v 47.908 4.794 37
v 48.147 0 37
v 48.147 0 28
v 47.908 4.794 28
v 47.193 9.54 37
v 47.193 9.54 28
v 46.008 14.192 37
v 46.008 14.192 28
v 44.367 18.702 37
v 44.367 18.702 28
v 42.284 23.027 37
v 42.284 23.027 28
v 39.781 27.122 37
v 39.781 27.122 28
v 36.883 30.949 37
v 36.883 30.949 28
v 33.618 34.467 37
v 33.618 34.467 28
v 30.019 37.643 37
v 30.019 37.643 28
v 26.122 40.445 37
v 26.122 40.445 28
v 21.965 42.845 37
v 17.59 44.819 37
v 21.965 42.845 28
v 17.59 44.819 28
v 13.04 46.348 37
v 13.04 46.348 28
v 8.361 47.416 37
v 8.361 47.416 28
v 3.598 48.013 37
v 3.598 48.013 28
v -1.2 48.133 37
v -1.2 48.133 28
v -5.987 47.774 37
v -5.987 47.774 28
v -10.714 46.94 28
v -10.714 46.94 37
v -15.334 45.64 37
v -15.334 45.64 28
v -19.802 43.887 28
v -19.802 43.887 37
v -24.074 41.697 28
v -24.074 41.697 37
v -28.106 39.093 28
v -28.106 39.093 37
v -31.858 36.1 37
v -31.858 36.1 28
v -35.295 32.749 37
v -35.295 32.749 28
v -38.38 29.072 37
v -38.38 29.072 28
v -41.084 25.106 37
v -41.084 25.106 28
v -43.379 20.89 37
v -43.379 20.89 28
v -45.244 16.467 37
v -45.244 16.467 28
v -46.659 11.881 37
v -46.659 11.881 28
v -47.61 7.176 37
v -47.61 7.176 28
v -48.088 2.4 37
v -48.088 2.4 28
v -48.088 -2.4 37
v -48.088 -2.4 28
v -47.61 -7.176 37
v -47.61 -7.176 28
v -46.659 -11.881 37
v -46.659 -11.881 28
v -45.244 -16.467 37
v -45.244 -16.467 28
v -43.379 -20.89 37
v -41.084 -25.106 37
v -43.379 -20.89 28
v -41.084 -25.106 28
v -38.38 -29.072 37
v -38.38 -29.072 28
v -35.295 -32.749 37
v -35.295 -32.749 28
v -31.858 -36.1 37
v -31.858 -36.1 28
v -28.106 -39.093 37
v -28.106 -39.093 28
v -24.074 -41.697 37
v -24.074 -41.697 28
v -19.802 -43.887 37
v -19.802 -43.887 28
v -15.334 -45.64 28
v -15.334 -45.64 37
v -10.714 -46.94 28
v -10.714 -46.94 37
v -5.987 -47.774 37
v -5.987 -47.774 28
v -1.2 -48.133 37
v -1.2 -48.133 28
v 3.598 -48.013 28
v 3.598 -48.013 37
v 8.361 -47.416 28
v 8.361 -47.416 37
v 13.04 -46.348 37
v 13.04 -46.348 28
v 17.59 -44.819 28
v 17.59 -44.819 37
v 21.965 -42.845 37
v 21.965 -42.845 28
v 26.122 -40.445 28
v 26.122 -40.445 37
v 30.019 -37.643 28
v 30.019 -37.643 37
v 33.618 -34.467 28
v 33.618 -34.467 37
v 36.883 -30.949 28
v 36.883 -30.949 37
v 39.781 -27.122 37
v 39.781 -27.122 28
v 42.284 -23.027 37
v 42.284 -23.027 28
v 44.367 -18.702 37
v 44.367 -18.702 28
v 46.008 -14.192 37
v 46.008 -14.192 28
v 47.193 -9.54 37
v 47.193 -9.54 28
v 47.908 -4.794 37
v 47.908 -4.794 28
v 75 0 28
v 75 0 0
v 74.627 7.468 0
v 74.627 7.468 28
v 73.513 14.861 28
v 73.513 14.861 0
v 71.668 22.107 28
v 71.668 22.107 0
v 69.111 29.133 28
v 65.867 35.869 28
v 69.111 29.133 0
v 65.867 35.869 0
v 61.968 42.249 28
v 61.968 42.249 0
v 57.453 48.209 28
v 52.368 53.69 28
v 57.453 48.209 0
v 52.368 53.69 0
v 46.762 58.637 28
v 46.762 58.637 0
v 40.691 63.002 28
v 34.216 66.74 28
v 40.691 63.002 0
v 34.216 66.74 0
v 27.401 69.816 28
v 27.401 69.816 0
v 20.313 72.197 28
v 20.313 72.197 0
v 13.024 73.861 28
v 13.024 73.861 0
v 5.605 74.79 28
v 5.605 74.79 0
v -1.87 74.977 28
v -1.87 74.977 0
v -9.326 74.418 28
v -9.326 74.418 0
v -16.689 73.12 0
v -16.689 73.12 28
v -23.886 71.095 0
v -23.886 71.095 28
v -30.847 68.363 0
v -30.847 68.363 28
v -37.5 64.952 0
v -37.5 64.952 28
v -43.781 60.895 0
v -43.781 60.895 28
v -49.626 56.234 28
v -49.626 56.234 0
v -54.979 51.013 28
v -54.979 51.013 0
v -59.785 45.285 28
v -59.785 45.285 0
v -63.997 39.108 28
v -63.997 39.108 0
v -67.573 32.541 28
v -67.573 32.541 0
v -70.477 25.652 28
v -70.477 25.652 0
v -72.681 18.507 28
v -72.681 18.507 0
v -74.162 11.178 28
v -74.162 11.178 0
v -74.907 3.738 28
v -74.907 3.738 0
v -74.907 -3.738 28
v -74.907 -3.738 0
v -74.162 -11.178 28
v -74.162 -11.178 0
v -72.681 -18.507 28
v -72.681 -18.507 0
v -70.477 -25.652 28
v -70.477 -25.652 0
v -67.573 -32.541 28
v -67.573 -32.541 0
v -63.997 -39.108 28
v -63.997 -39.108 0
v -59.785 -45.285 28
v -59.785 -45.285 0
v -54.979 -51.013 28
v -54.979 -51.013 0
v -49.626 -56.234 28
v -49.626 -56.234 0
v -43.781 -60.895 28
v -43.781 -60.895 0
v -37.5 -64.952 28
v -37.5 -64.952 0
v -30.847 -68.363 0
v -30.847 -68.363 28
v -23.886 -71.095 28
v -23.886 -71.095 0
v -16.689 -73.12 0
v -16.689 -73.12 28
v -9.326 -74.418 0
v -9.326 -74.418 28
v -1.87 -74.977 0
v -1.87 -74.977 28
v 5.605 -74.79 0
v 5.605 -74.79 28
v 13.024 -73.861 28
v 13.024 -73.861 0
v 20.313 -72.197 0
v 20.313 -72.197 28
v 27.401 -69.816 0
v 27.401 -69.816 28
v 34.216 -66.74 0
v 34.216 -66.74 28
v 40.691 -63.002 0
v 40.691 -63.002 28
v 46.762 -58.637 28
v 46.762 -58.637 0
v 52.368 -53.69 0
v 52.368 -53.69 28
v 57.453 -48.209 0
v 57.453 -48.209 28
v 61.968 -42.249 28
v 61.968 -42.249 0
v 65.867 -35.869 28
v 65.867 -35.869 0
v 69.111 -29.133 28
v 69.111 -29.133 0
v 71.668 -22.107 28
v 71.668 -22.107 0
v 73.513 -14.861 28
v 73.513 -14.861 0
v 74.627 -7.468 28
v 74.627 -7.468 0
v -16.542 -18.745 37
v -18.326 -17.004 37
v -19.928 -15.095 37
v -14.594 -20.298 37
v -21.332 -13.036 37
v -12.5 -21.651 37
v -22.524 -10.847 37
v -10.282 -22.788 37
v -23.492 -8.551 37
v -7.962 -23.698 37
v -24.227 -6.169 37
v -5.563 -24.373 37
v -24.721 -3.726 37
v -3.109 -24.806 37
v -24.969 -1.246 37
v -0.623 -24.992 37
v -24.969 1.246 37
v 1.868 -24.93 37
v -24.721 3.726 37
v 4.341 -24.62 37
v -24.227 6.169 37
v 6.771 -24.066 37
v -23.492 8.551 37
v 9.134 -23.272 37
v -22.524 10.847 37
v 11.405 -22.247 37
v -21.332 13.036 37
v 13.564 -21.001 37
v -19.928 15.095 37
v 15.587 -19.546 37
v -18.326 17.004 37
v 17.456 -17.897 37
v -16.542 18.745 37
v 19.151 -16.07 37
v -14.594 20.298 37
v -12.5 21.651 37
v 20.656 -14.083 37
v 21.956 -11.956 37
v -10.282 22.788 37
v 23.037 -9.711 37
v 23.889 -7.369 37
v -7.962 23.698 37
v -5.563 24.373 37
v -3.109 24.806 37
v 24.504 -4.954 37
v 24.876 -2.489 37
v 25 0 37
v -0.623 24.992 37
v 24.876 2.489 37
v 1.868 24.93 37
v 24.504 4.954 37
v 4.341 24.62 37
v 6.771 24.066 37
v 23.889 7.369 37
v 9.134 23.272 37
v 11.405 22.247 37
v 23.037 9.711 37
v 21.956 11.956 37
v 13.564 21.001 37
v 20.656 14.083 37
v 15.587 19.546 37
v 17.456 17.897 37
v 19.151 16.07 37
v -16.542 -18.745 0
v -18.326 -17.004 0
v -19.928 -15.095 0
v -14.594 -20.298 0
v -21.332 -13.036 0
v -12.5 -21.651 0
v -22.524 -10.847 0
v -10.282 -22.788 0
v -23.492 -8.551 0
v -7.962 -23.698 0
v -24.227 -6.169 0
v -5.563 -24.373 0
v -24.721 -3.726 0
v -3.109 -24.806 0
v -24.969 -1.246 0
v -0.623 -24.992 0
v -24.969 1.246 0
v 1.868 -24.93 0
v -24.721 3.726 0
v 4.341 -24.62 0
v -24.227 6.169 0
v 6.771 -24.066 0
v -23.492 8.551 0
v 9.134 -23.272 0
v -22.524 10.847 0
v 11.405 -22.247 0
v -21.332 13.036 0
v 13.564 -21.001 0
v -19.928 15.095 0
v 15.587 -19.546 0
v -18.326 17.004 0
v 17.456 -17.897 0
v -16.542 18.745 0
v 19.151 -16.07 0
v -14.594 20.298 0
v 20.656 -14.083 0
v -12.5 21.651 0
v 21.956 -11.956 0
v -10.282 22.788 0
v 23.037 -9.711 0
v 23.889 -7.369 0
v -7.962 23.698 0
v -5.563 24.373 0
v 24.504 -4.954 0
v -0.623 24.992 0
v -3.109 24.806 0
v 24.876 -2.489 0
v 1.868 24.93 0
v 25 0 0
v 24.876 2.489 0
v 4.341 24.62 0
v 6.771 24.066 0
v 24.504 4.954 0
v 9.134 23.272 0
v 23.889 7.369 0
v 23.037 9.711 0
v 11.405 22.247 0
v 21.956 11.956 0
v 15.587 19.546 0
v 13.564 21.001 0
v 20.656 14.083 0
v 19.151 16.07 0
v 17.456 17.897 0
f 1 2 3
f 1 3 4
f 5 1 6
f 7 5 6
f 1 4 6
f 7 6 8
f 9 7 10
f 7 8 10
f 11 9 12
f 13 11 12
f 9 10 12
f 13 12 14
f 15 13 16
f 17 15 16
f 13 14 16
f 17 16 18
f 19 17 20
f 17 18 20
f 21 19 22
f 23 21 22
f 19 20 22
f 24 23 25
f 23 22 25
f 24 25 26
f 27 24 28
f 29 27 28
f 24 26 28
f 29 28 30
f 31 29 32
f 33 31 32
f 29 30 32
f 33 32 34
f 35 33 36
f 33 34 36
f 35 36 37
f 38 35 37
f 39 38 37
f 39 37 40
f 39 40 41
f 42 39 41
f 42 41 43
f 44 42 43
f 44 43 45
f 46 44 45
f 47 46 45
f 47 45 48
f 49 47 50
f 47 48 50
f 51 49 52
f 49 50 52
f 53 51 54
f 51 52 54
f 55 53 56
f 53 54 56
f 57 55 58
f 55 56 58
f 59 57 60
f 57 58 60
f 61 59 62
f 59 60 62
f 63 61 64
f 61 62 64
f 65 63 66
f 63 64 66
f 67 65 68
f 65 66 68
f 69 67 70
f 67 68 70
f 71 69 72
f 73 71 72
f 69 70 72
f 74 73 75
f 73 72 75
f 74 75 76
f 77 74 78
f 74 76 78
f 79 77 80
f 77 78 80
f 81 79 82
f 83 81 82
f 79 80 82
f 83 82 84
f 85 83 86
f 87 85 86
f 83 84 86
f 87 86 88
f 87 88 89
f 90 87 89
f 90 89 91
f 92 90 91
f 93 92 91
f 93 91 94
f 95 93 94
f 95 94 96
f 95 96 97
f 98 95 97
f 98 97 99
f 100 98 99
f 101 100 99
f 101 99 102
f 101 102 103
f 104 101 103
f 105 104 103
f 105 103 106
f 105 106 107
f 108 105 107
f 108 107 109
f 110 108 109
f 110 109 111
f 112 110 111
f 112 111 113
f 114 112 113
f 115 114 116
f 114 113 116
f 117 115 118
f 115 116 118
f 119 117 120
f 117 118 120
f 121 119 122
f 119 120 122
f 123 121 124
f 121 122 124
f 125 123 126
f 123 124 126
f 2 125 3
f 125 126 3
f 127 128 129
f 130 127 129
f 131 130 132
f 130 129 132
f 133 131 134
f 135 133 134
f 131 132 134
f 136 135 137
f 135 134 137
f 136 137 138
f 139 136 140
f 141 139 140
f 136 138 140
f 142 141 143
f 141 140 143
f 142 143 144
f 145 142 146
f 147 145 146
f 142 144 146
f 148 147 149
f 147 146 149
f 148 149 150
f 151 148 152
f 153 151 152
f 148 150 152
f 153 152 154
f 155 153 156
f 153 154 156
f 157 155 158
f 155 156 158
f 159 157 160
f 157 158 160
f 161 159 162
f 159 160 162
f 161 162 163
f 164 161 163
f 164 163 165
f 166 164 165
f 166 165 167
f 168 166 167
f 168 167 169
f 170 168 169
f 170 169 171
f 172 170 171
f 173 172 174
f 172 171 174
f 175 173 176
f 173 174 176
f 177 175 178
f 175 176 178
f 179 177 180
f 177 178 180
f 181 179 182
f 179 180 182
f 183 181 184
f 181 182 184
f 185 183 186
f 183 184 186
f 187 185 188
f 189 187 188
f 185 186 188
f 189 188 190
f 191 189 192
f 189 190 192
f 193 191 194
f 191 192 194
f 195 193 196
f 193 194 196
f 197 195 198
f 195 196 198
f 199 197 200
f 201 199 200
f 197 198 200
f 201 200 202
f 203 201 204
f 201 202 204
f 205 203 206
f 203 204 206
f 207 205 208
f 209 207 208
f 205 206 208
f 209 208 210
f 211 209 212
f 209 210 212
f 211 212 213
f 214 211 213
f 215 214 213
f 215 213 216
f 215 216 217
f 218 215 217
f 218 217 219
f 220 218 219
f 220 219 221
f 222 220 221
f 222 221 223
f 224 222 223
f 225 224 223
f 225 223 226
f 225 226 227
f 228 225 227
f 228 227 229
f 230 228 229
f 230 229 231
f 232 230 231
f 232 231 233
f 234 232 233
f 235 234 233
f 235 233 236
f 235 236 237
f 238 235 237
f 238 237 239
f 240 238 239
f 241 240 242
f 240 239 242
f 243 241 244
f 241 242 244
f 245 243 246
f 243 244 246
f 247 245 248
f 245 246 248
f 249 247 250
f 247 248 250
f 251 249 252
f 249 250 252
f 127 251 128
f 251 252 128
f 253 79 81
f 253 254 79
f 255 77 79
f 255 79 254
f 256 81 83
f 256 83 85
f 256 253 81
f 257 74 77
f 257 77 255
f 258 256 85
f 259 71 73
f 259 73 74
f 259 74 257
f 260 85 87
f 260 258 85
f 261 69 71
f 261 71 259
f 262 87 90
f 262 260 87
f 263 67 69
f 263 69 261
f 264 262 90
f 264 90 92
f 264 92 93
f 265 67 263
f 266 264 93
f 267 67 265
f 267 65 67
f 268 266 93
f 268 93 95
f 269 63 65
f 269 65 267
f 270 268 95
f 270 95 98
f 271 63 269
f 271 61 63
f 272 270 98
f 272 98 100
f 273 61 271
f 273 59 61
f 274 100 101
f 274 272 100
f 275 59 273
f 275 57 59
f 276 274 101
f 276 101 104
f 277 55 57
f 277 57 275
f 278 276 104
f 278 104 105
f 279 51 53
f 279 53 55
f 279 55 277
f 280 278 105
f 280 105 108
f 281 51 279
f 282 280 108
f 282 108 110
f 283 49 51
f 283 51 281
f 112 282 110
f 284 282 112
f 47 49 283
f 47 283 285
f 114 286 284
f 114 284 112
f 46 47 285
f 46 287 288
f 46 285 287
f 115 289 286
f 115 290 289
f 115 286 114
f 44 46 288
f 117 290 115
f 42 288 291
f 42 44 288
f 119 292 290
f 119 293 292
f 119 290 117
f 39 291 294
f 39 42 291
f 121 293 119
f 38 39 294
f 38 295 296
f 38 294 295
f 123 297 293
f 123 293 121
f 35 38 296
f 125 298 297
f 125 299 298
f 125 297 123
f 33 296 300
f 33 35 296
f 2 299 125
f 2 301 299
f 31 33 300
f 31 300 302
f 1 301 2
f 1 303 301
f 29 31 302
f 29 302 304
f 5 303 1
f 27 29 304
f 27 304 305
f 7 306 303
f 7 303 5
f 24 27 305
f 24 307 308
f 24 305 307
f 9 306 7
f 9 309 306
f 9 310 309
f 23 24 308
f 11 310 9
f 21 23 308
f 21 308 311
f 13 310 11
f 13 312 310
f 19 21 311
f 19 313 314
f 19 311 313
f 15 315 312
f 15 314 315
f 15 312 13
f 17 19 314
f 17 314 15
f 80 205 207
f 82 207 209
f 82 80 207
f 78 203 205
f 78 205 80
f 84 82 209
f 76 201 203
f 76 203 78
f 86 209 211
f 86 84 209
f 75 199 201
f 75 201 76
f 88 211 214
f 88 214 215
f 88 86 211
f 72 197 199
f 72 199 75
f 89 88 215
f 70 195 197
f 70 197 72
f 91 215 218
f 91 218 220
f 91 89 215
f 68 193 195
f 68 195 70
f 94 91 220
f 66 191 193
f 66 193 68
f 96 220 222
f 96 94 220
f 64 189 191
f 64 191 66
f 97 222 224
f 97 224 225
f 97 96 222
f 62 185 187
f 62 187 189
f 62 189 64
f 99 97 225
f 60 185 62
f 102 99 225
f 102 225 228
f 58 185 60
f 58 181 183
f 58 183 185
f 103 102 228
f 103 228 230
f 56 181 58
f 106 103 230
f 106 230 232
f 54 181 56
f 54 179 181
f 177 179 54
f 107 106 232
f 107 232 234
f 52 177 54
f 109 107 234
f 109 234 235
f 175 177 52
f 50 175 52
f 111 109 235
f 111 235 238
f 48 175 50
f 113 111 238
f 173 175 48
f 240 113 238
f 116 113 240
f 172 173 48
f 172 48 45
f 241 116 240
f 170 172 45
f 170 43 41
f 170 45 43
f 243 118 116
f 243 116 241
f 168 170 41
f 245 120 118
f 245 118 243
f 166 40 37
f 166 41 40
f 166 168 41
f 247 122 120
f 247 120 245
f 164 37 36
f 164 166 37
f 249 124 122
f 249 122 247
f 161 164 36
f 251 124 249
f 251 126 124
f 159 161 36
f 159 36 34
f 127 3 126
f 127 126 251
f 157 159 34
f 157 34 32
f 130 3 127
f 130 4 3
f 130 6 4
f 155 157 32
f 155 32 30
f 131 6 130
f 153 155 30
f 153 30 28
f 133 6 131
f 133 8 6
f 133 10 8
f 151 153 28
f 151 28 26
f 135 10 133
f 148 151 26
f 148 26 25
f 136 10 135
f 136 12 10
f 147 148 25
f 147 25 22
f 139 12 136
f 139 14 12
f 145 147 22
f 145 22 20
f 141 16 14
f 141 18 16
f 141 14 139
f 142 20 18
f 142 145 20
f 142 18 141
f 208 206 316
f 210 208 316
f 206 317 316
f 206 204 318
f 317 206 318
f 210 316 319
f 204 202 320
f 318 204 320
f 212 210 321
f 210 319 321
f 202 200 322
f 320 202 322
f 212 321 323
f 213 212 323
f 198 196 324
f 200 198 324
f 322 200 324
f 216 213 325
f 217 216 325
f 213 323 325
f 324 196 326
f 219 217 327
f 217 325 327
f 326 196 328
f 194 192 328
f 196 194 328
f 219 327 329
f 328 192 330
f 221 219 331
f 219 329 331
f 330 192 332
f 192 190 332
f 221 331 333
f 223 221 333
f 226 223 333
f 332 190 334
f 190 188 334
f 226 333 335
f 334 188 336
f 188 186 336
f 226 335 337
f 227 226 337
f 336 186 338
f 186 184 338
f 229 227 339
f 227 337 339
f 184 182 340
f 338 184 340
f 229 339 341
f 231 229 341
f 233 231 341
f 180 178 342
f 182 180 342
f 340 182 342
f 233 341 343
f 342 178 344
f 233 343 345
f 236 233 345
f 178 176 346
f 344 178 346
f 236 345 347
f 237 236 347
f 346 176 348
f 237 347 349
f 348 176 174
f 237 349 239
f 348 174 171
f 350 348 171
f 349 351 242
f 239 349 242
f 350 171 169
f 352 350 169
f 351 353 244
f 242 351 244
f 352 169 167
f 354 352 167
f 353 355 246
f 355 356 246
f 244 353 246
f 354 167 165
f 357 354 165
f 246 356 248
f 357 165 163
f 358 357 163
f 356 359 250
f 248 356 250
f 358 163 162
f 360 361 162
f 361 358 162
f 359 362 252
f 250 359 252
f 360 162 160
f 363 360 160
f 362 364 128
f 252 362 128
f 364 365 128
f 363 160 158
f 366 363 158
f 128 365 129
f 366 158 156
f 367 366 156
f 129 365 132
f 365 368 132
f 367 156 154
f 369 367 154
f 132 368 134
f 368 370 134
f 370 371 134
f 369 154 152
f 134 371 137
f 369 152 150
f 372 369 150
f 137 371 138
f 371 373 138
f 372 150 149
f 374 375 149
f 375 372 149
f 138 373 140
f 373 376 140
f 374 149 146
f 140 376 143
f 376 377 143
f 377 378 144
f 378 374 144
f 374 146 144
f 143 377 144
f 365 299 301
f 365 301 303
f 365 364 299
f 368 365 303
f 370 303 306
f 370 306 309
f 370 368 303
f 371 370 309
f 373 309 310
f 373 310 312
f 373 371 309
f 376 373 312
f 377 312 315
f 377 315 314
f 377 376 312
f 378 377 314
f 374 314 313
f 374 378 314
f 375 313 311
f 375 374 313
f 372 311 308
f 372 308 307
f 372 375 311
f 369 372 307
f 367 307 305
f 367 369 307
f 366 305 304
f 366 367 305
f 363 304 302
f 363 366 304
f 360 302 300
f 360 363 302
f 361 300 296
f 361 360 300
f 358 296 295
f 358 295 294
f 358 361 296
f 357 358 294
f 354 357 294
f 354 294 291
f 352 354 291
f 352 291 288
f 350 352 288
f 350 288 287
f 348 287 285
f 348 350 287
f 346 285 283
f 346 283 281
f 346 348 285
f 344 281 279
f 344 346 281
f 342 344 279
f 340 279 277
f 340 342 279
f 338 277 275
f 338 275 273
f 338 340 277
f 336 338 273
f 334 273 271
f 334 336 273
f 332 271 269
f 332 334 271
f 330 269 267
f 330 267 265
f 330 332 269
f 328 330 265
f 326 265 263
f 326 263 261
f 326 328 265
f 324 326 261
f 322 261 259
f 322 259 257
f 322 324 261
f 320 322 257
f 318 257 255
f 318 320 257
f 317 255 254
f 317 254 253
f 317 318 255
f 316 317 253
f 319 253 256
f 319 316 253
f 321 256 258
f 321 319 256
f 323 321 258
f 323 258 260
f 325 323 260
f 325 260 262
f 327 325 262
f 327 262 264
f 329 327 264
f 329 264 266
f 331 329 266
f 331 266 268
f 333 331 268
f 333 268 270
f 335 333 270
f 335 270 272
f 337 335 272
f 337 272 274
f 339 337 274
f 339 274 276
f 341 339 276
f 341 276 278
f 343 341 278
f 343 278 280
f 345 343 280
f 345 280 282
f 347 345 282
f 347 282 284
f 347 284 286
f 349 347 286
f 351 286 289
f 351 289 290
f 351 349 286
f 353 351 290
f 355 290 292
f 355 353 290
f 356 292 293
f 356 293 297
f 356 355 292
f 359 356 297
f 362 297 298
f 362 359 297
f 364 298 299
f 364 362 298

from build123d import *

# Parameters (mm, degrees)
F0_R     = 75
F0_R_2   = 25
F1_DEPTH = 28
F2_R     = 48.1474701807
F2_R_2   = 25
F3_DEPTH = 9
F4_R     = 39.9409386185
F4_R_2   = 25
F5_DEPTH = 15


with BuildPart() as f1:
    # F0 (on Top) → F1 (new body)
    with BuildSketch(Plane.XY):
        Circle(F0_R)
        Circle(F0_R_2, mode=Mode.SUBTRACT)
    extrude(amount=F1_DEPTH)

    # F2 (on face) → F3 (join)
    with BuildSketch(Plane.XY.offset(28)):
        Circle(F2_R)
        Circle(F2_R_2, mode=Mode.SUBTRACT)
    extrude(amount=F3_DEPTH)

    # F4 (on face) → F5 (join)
    with BuildSketch(Plane.XY.offset(37)):
        Circle(F4_R)
        Circle(F4_R_2, mode=Mode.SUBTRACT)
    extrude(amount=-F5_DEPTH)


solid = f1.part
